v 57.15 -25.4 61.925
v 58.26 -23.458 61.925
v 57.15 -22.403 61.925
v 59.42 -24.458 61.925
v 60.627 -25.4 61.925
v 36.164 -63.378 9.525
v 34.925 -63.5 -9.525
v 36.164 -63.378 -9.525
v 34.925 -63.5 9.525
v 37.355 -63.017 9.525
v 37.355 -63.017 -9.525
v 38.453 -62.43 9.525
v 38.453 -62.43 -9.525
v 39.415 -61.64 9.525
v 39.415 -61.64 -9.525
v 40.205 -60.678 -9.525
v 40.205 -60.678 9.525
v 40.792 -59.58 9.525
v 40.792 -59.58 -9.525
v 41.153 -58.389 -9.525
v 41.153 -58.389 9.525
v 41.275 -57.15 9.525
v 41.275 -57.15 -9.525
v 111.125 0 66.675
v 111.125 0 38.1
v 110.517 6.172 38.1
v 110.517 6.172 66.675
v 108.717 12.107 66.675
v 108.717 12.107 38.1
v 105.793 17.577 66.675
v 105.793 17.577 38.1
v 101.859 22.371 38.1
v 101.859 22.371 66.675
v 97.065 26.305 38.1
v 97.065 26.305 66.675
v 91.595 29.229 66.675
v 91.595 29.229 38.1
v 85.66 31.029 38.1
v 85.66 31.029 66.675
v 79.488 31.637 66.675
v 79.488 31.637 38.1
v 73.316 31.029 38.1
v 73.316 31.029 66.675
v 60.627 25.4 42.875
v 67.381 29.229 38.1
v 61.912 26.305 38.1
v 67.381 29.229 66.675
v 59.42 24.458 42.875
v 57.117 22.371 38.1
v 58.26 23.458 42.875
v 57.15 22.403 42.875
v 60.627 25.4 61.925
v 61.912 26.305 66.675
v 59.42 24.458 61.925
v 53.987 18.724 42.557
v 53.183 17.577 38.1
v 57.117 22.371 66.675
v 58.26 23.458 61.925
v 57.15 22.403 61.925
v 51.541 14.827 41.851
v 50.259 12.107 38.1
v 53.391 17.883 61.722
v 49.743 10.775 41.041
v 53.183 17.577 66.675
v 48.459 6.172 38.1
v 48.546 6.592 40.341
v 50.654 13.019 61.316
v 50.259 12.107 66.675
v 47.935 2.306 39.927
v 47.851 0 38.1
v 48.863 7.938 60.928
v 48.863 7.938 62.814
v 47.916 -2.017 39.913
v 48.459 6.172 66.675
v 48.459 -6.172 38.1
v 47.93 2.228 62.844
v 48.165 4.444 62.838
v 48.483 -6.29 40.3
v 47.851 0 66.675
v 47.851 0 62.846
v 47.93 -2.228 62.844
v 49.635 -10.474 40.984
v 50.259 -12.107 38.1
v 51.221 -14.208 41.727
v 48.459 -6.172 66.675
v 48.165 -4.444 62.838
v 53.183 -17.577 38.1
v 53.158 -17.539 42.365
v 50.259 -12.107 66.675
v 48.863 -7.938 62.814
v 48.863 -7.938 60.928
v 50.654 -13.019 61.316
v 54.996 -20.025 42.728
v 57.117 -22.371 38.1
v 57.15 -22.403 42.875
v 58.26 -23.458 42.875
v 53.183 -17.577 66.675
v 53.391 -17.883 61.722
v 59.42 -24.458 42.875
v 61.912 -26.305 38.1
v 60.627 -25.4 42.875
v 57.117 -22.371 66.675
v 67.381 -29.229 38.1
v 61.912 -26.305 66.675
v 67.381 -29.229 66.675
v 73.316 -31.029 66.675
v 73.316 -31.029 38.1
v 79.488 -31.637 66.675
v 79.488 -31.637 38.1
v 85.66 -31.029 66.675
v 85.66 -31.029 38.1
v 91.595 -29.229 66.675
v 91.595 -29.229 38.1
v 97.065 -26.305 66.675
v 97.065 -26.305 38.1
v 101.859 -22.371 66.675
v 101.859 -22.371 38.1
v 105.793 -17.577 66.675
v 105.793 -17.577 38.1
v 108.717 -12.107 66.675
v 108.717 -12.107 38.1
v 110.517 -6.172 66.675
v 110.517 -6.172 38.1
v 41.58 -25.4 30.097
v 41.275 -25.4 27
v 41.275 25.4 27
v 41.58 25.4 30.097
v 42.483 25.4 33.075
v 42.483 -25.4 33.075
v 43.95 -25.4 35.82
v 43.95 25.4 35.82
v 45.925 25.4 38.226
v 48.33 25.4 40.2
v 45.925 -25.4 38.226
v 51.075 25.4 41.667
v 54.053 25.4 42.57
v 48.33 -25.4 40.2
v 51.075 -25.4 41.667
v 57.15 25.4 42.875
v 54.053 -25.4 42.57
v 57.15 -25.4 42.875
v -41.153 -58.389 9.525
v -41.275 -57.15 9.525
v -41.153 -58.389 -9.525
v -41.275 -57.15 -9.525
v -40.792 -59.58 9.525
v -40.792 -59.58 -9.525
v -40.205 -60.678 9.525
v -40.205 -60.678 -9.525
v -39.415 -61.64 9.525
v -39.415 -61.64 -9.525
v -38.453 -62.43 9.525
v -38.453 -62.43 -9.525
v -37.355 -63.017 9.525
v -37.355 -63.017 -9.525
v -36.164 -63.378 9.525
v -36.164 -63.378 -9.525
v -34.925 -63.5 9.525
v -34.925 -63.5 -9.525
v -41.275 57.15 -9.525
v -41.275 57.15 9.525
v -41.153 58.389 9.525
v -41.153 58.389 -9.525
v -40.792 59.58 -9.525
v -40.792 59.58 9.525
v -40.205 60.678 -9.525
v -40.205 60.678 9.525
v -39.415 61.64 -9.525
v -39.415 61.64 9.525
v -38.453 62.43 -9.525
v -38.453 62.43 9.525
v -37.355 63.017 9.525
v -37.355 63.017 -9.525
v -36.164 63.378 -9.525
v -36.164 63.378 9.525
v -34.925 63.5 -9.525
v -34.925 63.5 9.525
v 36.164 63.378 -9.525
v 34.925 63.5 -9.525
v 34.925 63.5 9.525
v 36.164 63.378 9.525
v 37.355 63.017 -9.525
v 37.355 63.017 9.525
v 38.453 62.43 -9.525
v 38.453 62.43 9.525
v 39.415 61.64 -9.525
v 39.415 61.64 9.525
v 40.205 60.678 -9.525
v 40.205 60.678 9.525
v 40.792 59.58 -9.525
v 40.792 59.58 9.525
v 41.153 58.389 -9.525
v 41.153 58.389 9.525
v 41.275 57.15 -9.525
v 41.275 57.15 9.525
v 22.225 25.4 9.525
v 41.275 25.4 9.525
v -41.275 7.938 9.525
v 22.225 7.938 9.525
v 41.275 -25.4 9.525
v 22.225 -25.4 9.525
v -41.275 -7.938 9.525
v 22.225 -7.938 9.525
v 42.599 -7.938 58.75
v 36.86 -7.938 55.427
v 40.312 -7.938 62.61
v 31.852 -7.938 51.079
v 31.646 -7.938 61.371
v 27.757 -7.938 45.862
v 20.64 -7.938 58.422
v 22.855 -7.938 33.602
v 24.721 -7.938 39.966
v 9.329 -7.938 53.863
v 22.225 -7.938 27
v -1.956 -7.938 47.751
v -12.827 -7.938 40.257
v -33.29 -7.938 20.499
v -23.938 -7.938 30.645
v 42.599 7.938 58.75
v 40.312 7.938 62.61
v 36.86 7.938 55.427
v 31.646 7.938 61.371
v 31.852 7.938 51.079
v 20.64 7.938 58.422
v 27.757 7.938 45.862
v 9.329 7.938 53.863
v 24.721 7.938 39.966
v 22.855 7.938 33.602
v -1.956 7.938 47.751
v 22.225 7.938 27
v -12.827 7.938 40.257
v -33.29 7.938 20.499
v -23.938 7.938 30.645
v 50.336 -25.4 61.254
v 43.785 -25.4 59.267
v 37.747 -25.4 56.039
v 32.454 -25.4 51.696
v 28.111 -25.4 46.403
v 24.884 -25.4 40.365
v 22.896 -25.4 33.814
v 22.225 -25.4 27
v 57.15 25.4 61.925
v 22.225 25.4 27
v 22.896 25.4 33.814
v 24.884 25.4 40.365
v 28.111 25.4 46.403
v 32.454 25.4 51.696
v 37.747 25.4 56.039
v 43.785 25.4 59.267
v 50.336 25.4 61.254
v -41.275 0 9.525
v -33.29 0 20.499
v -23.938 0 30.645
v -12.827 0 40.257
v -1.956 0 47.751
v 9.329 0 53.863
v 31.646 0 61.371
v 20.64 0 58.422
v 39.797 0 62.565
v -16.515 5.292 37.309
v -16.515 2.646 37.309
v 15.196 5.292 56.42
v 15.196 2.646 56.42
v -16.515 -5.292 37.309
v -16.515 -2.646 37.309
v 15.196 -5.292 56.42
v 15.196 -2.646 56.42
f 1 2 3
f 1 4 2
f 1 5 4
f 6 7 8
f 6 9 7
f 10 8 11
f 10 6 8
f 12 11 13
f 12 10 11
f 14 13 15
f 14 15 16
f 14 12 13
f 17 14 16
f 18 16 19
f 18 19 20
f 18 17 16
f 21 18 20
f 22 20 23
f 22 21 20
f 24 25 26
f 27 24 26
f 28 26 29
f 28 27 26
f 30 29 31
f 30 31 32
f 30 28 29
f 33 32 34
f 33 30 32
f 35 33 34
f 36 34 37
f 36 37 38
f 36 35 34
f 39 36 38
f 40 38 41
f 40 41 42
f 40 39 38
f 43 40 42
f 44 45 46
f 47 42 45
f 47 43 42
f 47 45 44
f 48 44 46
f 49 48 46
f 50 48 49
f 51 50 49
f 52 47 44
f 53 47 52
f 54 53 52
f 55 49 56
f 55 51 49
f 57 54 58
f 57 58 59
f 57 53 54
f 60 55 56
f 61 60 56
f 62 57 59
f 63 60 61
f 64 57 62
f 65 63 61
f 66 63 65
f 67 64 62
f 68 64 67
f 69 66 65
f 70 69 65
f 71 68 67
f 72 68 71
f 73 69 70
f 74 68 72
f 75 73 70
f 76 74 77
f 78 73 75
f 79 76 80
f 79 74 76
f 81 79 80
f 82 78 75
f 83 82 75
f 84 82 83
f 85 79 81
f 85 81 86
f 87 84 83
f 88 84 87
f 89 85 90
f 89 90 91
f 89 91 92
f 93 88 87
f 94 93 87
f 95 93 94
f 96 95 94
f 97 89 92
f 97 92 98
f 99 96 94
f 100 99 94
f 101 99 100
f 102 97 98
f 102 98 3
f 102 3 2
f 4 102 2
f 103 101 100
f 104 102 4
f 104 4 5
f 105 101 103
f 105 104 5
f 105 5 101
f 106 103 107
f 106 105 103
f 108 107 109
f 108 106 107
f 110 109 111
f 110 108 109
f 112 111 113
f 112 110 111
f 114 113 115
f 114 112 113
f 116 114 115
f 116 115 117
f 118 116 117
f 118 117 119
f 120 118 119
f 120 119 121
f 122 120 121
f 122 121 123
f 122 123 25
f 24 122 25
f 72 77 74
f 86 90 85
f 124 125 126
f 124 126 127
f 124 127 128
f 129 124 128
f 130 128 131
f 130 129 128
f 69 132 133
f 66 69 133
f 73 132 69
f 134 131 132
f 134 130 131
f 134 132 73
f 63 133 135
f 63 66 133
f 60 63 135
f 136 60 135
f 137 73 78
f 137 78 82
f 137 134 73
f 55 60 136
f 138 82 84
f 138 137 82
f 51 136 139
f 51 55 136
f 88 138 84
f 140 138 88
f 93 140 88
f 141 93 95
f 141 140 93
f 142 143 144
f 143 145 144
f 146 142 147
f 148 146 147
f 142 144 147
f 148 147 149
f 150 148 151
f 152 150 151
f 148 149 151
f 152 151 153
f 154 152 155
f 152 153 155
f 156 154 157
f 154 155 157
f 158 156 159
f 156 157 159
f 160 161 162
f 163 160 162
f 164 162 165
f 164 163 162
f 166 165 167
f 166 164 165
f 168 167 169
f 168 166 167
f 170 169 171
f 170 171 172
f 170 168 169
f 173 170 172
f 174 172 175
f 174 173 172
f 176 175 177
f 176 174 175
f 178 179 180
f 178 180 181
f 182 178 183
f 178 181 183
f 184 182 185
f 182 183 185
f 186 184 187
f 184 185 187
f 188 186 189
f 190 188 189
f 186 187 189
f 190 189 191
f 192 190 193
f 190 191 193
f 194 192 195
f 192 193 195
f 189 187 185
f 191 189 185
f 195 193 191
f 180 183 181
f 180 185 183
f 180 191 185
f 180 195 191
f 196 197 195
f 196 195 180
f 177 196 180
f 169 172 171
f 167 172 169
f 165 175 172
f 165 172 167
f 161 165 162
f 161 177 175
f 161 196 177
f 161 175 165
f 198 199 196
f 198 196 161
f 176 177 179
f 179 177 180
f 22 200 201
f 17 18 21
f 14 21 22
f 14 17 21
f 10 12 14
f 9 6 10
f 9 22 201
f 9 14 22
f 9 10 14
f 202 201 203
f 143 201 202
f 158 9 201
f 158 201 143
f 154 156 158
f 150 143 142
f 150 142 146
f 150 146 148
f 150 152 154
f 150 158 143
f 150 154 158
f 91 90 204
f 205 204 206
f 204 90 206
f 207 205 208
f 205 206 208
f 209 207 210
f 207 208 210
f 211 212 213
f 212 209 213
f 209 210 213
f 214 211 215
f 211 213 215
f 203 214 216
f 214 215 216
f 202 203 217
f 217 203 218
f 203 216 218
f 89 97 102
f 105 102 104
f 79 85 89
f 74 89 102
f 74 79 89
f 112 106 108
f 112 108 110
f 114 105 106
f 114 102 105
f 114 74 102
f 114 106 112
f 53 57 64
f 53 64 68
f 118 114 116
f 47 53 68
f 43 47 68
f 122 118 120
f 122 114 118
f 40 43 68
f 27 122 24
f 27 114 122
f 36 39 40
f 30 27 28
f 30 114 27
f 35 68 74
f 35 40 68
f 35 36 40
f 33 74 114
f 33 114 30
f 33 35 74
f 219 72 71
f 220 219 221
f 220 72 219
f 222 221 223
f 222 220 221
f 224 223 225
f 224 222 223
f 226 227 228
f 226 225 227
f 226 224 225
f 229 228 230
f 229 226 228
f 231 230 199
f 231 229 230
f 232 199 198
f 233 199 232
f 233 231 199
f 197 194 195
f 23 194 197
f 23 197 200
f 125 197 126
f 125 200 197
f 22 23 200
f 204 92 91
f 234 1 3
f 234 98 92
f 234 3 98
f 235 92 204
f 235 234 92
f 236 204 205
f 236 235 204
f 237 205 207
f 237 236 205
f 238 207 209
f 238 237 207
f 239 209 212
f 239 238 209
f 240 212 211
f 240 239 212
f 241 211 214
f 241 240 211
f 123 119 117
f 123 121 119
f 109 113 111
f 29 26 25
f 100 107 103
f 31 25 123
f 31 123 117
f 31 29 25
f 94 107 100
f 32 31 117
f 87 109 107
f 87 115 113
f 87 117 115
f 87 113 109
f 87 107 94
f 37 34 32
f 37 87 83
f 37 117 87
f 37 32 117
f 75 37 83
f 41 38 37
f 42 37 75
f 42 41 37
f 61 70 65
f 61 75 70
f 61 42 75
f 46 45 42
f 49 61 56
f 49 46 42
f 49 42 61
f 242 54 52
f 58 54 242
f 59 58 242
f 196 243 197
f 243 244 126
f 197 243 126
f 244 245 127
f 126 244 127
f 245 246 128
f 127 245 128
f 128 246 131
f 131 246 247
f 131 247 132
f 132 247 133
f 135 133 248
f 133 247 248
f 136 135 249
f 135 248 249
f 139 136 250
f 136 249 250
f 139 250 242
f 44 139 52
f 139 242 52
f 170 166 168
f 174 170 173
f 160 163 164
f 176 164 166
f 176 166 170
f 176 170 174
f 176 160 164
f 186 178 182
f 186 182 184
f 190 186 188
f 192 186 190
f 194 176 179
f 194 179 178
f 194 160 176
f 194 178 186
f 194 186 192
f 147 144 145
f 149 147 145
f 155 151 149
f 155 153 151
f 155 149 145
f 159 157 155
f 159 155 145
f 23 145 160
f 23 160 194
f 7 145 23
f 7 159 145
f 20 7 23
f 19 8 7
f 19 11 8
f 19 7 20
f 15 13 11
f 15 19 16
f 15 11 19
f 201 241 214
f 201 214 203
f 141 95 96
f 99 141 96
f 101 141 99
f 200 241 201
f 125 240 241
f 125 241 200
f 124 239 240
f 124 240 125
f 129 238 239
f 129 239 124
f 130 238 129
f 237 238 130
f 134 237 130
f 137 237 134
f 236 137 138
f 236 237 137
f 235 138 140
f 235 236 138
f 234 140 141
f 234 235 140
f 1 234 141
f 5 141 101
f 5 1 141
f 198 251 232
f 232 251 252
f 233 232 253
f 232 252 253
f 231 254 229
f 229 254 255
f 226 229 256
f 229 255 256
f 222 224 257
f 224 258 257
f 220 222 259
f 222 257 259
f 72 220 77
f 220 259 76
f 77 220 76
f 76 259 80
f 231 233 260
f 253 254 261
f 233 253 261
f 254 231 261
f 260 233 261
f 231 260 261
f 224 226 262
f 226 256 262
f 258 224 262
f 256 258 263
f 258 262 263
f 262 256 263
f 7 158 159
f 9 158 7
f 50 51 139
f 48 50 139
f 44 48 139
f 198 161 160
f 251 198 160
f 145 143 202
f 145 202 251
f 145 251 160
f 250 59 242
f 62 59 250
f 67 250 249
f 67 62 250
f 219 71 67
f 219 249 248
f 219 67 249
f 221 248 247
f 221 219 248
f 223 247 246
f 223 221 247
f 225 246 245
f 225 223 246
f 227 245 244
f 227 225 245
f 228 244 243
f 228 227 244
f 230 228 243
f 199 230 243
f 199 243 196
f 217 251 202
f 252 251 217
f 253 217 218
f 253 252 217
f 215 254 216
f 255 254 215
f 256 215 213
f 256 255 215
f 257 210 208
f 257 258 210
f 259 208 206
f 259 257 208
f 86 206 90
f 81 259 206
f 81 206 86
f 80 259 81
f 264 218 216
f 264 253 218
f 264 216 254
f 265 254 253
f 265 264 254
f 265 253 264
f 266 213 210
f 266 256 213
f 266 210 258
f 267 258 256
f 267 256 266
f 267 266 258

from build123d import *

# Parameters (mm, degrees)
F1_DEPTH = 63.5
F0_W     = 19.1631158481
F0_H     = 19.05
F2_DEPTH = 25.4
F3_DEPTH = 7.9375
F4_R     = 6.35


with BuildPart() as f1:
    # F0 (on Front) → F1 (new body, symmetric)
    with BuildSketch(Plane.XZ):
        Polygon((22.225, 9.525), (-41.275, 9.525), (-41.275, -9.525), (41.275, -9.525), (41.275, 9.525), align=None)
    extrude(amount=F1_DEPTH, both=True)

    # F0 (on Front) → F2 (join, symmetric)
    with BuildSketch(Plane.XZ):
        with BuildLine():
            Line((22.225, 27.0002), (22.225, 9.525))
            Line((22.225, 9.525), (41.275, 9.525))
            Line((41.275, 9.525), (41.275, 27.0002))
            ThreePointArc((41.275, 27.0002), (45.9246798487, 38.2255201513), (57.15, 42.8752))
            Line((57.15, 42.8752), (60.325, 42.8752))
            Line((60.325, 42.8752), (60.325, 61.9252))
            Line((60.325, 61.9252), (57.15, 61.9252))
            ThreePointArc((57.15, 61.9252), (32.4542956671, 51.6959043329), (22.225, 27.0002))
        make_face()
        with Locations((69.9065579241, 52.4002)):
            Rectangle(F0_W, F0_H)
    extrude(amount=F2_DEPTH, both=True)

    # F0 (on Front) → F3 (join, symmetric)
    with BuildSketch(Plane.XZ):
        with BuildLine():
            add(Edge.make_bspline(
                [(-41.275, 9.525), (-19.9898480937, 42.9106190082), (22.3848360241, 68.1215267785), (57.15, 61.9252)],
                knots=[0, 0, 0, 0, 111.5045361635, 111.5045361635, 111.5045361635, 111.5045361635], degree=3))
            Line((-41.275, 9.525), (22.225, 9.525))
            Line((22.225, 9.525), (22.225, 27.0002))
            ThreePointArc((22.225, 27.0002), (32.4542956671, 51.6959043329), (57.15, 61.9252))
        make_face()
    extrude(amount=F3_DEPTH, both=True)

    # F4
    f4_edges = [f1.edges().sort_by_distance(p)[0] for p in [
        (-41.275, -63.5, 0),
        (41.275, -63.5, 0),
        (41.275, 63.5, 0),
        (-41.275, 63.5, 0),
    ]]
    fillet(f4_edges, radius=F4_R)

    # F0 (on Front) → F5 (revolve)
    with BuildSketch(Plane.XZ):
        Polygon((79.4881158481, 66.675), (79.4881158481, 61.9252), (79.4881158481, 42.8752), (79.4881158481, 38.1), (111.125, 38.1), (111.125, 66.675), align=None)
    revolve(axis=Axis((79.4881158481, 0, 52.3875), (0, 0, 1)))


solid = f1.part
